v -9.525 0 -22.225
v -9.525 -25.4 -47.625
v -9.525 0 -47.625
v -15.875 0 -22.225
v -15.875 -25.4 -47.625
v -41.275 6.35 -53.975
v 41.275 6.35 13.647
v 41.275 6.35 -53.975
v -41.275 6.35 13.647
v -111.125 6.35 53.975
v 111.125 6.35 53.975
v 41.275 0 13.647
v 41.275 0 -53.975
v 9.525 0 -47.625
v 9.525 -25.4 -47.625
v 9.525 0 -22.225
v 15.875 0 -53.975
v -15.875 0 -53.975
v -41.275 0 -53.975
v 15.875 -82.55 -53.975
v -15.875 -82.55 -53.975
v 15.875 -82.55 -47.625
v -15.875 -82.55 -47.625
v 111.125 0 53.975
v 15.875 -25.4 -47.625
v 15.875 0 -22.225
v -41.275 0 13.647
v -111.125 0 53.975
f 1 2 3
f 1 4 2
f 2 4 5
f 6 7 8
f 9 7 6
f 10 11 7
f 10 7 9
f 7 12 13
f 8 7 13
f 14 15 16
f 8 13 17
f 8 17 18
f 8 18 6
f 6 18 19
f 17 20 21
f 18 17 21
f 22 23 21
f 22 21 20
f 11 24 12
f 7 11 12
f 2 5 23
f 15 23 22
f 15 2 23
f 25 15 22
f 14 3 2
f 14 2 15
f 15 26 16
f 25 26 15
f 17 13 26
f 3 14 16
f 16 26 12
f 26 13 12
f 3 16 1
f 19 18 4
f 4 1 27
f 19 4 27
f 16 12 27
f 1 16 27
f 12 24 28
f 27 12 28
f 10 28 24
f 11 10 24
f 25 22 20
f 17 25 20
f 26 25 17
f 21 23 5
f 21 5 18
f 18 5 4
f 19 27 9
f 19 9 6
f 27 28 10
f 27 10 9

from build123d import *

# Parameters (mm, degrees)
F1_DEPTH = 6.35
F3_W     = 31.75
F3_H     = 6.35
F4_DEPTH = 82.55
F6_DEPTH = 6.35


with BuildPart() as f1:
    # F0 (on Front) → F1 (new body)
    with BuildSketch(Plane.XZ):
        Polygon((-41.275, 13.647084), (-41.275, 53.975), (-111.125, 53.975), align=None)
        Polygon((0, 53.975), (-41.275, 53.975), (-41.275, 13.647084), (-41.275, -53.975), (0, -53.975), align=None)
    extrude(amount=-F1_DEPTH)

    # F2: F1 across plane


with BuildPart() as f1_1:
    add(f1.part)
    add(f1.part.mirror(Plane.YZ))

    # F3 (on Front) → F4 (join)
    with BuildSketch(Plane.XZ):
        with Locations((0, -50.8)):
            Rectangle(F3_W, F3_H)
    extrude(amount=F4_DEPTH)

    # F5 (on face) → F6 (join)
    with BuildSketch(Plane.YZ.offset(15.875)):
        Polygon((0, -22.225), (-25.4, -47.625), (0, -47.625), align=None)
    extrude(amount=-F6_DEPTH)

    # F7: F1 across plane


with BuildPart() as f1_2:
    add(f1_1.part)
    add(f1_1.part.mirror(Plane.YZ))


solid = f1_2.part
